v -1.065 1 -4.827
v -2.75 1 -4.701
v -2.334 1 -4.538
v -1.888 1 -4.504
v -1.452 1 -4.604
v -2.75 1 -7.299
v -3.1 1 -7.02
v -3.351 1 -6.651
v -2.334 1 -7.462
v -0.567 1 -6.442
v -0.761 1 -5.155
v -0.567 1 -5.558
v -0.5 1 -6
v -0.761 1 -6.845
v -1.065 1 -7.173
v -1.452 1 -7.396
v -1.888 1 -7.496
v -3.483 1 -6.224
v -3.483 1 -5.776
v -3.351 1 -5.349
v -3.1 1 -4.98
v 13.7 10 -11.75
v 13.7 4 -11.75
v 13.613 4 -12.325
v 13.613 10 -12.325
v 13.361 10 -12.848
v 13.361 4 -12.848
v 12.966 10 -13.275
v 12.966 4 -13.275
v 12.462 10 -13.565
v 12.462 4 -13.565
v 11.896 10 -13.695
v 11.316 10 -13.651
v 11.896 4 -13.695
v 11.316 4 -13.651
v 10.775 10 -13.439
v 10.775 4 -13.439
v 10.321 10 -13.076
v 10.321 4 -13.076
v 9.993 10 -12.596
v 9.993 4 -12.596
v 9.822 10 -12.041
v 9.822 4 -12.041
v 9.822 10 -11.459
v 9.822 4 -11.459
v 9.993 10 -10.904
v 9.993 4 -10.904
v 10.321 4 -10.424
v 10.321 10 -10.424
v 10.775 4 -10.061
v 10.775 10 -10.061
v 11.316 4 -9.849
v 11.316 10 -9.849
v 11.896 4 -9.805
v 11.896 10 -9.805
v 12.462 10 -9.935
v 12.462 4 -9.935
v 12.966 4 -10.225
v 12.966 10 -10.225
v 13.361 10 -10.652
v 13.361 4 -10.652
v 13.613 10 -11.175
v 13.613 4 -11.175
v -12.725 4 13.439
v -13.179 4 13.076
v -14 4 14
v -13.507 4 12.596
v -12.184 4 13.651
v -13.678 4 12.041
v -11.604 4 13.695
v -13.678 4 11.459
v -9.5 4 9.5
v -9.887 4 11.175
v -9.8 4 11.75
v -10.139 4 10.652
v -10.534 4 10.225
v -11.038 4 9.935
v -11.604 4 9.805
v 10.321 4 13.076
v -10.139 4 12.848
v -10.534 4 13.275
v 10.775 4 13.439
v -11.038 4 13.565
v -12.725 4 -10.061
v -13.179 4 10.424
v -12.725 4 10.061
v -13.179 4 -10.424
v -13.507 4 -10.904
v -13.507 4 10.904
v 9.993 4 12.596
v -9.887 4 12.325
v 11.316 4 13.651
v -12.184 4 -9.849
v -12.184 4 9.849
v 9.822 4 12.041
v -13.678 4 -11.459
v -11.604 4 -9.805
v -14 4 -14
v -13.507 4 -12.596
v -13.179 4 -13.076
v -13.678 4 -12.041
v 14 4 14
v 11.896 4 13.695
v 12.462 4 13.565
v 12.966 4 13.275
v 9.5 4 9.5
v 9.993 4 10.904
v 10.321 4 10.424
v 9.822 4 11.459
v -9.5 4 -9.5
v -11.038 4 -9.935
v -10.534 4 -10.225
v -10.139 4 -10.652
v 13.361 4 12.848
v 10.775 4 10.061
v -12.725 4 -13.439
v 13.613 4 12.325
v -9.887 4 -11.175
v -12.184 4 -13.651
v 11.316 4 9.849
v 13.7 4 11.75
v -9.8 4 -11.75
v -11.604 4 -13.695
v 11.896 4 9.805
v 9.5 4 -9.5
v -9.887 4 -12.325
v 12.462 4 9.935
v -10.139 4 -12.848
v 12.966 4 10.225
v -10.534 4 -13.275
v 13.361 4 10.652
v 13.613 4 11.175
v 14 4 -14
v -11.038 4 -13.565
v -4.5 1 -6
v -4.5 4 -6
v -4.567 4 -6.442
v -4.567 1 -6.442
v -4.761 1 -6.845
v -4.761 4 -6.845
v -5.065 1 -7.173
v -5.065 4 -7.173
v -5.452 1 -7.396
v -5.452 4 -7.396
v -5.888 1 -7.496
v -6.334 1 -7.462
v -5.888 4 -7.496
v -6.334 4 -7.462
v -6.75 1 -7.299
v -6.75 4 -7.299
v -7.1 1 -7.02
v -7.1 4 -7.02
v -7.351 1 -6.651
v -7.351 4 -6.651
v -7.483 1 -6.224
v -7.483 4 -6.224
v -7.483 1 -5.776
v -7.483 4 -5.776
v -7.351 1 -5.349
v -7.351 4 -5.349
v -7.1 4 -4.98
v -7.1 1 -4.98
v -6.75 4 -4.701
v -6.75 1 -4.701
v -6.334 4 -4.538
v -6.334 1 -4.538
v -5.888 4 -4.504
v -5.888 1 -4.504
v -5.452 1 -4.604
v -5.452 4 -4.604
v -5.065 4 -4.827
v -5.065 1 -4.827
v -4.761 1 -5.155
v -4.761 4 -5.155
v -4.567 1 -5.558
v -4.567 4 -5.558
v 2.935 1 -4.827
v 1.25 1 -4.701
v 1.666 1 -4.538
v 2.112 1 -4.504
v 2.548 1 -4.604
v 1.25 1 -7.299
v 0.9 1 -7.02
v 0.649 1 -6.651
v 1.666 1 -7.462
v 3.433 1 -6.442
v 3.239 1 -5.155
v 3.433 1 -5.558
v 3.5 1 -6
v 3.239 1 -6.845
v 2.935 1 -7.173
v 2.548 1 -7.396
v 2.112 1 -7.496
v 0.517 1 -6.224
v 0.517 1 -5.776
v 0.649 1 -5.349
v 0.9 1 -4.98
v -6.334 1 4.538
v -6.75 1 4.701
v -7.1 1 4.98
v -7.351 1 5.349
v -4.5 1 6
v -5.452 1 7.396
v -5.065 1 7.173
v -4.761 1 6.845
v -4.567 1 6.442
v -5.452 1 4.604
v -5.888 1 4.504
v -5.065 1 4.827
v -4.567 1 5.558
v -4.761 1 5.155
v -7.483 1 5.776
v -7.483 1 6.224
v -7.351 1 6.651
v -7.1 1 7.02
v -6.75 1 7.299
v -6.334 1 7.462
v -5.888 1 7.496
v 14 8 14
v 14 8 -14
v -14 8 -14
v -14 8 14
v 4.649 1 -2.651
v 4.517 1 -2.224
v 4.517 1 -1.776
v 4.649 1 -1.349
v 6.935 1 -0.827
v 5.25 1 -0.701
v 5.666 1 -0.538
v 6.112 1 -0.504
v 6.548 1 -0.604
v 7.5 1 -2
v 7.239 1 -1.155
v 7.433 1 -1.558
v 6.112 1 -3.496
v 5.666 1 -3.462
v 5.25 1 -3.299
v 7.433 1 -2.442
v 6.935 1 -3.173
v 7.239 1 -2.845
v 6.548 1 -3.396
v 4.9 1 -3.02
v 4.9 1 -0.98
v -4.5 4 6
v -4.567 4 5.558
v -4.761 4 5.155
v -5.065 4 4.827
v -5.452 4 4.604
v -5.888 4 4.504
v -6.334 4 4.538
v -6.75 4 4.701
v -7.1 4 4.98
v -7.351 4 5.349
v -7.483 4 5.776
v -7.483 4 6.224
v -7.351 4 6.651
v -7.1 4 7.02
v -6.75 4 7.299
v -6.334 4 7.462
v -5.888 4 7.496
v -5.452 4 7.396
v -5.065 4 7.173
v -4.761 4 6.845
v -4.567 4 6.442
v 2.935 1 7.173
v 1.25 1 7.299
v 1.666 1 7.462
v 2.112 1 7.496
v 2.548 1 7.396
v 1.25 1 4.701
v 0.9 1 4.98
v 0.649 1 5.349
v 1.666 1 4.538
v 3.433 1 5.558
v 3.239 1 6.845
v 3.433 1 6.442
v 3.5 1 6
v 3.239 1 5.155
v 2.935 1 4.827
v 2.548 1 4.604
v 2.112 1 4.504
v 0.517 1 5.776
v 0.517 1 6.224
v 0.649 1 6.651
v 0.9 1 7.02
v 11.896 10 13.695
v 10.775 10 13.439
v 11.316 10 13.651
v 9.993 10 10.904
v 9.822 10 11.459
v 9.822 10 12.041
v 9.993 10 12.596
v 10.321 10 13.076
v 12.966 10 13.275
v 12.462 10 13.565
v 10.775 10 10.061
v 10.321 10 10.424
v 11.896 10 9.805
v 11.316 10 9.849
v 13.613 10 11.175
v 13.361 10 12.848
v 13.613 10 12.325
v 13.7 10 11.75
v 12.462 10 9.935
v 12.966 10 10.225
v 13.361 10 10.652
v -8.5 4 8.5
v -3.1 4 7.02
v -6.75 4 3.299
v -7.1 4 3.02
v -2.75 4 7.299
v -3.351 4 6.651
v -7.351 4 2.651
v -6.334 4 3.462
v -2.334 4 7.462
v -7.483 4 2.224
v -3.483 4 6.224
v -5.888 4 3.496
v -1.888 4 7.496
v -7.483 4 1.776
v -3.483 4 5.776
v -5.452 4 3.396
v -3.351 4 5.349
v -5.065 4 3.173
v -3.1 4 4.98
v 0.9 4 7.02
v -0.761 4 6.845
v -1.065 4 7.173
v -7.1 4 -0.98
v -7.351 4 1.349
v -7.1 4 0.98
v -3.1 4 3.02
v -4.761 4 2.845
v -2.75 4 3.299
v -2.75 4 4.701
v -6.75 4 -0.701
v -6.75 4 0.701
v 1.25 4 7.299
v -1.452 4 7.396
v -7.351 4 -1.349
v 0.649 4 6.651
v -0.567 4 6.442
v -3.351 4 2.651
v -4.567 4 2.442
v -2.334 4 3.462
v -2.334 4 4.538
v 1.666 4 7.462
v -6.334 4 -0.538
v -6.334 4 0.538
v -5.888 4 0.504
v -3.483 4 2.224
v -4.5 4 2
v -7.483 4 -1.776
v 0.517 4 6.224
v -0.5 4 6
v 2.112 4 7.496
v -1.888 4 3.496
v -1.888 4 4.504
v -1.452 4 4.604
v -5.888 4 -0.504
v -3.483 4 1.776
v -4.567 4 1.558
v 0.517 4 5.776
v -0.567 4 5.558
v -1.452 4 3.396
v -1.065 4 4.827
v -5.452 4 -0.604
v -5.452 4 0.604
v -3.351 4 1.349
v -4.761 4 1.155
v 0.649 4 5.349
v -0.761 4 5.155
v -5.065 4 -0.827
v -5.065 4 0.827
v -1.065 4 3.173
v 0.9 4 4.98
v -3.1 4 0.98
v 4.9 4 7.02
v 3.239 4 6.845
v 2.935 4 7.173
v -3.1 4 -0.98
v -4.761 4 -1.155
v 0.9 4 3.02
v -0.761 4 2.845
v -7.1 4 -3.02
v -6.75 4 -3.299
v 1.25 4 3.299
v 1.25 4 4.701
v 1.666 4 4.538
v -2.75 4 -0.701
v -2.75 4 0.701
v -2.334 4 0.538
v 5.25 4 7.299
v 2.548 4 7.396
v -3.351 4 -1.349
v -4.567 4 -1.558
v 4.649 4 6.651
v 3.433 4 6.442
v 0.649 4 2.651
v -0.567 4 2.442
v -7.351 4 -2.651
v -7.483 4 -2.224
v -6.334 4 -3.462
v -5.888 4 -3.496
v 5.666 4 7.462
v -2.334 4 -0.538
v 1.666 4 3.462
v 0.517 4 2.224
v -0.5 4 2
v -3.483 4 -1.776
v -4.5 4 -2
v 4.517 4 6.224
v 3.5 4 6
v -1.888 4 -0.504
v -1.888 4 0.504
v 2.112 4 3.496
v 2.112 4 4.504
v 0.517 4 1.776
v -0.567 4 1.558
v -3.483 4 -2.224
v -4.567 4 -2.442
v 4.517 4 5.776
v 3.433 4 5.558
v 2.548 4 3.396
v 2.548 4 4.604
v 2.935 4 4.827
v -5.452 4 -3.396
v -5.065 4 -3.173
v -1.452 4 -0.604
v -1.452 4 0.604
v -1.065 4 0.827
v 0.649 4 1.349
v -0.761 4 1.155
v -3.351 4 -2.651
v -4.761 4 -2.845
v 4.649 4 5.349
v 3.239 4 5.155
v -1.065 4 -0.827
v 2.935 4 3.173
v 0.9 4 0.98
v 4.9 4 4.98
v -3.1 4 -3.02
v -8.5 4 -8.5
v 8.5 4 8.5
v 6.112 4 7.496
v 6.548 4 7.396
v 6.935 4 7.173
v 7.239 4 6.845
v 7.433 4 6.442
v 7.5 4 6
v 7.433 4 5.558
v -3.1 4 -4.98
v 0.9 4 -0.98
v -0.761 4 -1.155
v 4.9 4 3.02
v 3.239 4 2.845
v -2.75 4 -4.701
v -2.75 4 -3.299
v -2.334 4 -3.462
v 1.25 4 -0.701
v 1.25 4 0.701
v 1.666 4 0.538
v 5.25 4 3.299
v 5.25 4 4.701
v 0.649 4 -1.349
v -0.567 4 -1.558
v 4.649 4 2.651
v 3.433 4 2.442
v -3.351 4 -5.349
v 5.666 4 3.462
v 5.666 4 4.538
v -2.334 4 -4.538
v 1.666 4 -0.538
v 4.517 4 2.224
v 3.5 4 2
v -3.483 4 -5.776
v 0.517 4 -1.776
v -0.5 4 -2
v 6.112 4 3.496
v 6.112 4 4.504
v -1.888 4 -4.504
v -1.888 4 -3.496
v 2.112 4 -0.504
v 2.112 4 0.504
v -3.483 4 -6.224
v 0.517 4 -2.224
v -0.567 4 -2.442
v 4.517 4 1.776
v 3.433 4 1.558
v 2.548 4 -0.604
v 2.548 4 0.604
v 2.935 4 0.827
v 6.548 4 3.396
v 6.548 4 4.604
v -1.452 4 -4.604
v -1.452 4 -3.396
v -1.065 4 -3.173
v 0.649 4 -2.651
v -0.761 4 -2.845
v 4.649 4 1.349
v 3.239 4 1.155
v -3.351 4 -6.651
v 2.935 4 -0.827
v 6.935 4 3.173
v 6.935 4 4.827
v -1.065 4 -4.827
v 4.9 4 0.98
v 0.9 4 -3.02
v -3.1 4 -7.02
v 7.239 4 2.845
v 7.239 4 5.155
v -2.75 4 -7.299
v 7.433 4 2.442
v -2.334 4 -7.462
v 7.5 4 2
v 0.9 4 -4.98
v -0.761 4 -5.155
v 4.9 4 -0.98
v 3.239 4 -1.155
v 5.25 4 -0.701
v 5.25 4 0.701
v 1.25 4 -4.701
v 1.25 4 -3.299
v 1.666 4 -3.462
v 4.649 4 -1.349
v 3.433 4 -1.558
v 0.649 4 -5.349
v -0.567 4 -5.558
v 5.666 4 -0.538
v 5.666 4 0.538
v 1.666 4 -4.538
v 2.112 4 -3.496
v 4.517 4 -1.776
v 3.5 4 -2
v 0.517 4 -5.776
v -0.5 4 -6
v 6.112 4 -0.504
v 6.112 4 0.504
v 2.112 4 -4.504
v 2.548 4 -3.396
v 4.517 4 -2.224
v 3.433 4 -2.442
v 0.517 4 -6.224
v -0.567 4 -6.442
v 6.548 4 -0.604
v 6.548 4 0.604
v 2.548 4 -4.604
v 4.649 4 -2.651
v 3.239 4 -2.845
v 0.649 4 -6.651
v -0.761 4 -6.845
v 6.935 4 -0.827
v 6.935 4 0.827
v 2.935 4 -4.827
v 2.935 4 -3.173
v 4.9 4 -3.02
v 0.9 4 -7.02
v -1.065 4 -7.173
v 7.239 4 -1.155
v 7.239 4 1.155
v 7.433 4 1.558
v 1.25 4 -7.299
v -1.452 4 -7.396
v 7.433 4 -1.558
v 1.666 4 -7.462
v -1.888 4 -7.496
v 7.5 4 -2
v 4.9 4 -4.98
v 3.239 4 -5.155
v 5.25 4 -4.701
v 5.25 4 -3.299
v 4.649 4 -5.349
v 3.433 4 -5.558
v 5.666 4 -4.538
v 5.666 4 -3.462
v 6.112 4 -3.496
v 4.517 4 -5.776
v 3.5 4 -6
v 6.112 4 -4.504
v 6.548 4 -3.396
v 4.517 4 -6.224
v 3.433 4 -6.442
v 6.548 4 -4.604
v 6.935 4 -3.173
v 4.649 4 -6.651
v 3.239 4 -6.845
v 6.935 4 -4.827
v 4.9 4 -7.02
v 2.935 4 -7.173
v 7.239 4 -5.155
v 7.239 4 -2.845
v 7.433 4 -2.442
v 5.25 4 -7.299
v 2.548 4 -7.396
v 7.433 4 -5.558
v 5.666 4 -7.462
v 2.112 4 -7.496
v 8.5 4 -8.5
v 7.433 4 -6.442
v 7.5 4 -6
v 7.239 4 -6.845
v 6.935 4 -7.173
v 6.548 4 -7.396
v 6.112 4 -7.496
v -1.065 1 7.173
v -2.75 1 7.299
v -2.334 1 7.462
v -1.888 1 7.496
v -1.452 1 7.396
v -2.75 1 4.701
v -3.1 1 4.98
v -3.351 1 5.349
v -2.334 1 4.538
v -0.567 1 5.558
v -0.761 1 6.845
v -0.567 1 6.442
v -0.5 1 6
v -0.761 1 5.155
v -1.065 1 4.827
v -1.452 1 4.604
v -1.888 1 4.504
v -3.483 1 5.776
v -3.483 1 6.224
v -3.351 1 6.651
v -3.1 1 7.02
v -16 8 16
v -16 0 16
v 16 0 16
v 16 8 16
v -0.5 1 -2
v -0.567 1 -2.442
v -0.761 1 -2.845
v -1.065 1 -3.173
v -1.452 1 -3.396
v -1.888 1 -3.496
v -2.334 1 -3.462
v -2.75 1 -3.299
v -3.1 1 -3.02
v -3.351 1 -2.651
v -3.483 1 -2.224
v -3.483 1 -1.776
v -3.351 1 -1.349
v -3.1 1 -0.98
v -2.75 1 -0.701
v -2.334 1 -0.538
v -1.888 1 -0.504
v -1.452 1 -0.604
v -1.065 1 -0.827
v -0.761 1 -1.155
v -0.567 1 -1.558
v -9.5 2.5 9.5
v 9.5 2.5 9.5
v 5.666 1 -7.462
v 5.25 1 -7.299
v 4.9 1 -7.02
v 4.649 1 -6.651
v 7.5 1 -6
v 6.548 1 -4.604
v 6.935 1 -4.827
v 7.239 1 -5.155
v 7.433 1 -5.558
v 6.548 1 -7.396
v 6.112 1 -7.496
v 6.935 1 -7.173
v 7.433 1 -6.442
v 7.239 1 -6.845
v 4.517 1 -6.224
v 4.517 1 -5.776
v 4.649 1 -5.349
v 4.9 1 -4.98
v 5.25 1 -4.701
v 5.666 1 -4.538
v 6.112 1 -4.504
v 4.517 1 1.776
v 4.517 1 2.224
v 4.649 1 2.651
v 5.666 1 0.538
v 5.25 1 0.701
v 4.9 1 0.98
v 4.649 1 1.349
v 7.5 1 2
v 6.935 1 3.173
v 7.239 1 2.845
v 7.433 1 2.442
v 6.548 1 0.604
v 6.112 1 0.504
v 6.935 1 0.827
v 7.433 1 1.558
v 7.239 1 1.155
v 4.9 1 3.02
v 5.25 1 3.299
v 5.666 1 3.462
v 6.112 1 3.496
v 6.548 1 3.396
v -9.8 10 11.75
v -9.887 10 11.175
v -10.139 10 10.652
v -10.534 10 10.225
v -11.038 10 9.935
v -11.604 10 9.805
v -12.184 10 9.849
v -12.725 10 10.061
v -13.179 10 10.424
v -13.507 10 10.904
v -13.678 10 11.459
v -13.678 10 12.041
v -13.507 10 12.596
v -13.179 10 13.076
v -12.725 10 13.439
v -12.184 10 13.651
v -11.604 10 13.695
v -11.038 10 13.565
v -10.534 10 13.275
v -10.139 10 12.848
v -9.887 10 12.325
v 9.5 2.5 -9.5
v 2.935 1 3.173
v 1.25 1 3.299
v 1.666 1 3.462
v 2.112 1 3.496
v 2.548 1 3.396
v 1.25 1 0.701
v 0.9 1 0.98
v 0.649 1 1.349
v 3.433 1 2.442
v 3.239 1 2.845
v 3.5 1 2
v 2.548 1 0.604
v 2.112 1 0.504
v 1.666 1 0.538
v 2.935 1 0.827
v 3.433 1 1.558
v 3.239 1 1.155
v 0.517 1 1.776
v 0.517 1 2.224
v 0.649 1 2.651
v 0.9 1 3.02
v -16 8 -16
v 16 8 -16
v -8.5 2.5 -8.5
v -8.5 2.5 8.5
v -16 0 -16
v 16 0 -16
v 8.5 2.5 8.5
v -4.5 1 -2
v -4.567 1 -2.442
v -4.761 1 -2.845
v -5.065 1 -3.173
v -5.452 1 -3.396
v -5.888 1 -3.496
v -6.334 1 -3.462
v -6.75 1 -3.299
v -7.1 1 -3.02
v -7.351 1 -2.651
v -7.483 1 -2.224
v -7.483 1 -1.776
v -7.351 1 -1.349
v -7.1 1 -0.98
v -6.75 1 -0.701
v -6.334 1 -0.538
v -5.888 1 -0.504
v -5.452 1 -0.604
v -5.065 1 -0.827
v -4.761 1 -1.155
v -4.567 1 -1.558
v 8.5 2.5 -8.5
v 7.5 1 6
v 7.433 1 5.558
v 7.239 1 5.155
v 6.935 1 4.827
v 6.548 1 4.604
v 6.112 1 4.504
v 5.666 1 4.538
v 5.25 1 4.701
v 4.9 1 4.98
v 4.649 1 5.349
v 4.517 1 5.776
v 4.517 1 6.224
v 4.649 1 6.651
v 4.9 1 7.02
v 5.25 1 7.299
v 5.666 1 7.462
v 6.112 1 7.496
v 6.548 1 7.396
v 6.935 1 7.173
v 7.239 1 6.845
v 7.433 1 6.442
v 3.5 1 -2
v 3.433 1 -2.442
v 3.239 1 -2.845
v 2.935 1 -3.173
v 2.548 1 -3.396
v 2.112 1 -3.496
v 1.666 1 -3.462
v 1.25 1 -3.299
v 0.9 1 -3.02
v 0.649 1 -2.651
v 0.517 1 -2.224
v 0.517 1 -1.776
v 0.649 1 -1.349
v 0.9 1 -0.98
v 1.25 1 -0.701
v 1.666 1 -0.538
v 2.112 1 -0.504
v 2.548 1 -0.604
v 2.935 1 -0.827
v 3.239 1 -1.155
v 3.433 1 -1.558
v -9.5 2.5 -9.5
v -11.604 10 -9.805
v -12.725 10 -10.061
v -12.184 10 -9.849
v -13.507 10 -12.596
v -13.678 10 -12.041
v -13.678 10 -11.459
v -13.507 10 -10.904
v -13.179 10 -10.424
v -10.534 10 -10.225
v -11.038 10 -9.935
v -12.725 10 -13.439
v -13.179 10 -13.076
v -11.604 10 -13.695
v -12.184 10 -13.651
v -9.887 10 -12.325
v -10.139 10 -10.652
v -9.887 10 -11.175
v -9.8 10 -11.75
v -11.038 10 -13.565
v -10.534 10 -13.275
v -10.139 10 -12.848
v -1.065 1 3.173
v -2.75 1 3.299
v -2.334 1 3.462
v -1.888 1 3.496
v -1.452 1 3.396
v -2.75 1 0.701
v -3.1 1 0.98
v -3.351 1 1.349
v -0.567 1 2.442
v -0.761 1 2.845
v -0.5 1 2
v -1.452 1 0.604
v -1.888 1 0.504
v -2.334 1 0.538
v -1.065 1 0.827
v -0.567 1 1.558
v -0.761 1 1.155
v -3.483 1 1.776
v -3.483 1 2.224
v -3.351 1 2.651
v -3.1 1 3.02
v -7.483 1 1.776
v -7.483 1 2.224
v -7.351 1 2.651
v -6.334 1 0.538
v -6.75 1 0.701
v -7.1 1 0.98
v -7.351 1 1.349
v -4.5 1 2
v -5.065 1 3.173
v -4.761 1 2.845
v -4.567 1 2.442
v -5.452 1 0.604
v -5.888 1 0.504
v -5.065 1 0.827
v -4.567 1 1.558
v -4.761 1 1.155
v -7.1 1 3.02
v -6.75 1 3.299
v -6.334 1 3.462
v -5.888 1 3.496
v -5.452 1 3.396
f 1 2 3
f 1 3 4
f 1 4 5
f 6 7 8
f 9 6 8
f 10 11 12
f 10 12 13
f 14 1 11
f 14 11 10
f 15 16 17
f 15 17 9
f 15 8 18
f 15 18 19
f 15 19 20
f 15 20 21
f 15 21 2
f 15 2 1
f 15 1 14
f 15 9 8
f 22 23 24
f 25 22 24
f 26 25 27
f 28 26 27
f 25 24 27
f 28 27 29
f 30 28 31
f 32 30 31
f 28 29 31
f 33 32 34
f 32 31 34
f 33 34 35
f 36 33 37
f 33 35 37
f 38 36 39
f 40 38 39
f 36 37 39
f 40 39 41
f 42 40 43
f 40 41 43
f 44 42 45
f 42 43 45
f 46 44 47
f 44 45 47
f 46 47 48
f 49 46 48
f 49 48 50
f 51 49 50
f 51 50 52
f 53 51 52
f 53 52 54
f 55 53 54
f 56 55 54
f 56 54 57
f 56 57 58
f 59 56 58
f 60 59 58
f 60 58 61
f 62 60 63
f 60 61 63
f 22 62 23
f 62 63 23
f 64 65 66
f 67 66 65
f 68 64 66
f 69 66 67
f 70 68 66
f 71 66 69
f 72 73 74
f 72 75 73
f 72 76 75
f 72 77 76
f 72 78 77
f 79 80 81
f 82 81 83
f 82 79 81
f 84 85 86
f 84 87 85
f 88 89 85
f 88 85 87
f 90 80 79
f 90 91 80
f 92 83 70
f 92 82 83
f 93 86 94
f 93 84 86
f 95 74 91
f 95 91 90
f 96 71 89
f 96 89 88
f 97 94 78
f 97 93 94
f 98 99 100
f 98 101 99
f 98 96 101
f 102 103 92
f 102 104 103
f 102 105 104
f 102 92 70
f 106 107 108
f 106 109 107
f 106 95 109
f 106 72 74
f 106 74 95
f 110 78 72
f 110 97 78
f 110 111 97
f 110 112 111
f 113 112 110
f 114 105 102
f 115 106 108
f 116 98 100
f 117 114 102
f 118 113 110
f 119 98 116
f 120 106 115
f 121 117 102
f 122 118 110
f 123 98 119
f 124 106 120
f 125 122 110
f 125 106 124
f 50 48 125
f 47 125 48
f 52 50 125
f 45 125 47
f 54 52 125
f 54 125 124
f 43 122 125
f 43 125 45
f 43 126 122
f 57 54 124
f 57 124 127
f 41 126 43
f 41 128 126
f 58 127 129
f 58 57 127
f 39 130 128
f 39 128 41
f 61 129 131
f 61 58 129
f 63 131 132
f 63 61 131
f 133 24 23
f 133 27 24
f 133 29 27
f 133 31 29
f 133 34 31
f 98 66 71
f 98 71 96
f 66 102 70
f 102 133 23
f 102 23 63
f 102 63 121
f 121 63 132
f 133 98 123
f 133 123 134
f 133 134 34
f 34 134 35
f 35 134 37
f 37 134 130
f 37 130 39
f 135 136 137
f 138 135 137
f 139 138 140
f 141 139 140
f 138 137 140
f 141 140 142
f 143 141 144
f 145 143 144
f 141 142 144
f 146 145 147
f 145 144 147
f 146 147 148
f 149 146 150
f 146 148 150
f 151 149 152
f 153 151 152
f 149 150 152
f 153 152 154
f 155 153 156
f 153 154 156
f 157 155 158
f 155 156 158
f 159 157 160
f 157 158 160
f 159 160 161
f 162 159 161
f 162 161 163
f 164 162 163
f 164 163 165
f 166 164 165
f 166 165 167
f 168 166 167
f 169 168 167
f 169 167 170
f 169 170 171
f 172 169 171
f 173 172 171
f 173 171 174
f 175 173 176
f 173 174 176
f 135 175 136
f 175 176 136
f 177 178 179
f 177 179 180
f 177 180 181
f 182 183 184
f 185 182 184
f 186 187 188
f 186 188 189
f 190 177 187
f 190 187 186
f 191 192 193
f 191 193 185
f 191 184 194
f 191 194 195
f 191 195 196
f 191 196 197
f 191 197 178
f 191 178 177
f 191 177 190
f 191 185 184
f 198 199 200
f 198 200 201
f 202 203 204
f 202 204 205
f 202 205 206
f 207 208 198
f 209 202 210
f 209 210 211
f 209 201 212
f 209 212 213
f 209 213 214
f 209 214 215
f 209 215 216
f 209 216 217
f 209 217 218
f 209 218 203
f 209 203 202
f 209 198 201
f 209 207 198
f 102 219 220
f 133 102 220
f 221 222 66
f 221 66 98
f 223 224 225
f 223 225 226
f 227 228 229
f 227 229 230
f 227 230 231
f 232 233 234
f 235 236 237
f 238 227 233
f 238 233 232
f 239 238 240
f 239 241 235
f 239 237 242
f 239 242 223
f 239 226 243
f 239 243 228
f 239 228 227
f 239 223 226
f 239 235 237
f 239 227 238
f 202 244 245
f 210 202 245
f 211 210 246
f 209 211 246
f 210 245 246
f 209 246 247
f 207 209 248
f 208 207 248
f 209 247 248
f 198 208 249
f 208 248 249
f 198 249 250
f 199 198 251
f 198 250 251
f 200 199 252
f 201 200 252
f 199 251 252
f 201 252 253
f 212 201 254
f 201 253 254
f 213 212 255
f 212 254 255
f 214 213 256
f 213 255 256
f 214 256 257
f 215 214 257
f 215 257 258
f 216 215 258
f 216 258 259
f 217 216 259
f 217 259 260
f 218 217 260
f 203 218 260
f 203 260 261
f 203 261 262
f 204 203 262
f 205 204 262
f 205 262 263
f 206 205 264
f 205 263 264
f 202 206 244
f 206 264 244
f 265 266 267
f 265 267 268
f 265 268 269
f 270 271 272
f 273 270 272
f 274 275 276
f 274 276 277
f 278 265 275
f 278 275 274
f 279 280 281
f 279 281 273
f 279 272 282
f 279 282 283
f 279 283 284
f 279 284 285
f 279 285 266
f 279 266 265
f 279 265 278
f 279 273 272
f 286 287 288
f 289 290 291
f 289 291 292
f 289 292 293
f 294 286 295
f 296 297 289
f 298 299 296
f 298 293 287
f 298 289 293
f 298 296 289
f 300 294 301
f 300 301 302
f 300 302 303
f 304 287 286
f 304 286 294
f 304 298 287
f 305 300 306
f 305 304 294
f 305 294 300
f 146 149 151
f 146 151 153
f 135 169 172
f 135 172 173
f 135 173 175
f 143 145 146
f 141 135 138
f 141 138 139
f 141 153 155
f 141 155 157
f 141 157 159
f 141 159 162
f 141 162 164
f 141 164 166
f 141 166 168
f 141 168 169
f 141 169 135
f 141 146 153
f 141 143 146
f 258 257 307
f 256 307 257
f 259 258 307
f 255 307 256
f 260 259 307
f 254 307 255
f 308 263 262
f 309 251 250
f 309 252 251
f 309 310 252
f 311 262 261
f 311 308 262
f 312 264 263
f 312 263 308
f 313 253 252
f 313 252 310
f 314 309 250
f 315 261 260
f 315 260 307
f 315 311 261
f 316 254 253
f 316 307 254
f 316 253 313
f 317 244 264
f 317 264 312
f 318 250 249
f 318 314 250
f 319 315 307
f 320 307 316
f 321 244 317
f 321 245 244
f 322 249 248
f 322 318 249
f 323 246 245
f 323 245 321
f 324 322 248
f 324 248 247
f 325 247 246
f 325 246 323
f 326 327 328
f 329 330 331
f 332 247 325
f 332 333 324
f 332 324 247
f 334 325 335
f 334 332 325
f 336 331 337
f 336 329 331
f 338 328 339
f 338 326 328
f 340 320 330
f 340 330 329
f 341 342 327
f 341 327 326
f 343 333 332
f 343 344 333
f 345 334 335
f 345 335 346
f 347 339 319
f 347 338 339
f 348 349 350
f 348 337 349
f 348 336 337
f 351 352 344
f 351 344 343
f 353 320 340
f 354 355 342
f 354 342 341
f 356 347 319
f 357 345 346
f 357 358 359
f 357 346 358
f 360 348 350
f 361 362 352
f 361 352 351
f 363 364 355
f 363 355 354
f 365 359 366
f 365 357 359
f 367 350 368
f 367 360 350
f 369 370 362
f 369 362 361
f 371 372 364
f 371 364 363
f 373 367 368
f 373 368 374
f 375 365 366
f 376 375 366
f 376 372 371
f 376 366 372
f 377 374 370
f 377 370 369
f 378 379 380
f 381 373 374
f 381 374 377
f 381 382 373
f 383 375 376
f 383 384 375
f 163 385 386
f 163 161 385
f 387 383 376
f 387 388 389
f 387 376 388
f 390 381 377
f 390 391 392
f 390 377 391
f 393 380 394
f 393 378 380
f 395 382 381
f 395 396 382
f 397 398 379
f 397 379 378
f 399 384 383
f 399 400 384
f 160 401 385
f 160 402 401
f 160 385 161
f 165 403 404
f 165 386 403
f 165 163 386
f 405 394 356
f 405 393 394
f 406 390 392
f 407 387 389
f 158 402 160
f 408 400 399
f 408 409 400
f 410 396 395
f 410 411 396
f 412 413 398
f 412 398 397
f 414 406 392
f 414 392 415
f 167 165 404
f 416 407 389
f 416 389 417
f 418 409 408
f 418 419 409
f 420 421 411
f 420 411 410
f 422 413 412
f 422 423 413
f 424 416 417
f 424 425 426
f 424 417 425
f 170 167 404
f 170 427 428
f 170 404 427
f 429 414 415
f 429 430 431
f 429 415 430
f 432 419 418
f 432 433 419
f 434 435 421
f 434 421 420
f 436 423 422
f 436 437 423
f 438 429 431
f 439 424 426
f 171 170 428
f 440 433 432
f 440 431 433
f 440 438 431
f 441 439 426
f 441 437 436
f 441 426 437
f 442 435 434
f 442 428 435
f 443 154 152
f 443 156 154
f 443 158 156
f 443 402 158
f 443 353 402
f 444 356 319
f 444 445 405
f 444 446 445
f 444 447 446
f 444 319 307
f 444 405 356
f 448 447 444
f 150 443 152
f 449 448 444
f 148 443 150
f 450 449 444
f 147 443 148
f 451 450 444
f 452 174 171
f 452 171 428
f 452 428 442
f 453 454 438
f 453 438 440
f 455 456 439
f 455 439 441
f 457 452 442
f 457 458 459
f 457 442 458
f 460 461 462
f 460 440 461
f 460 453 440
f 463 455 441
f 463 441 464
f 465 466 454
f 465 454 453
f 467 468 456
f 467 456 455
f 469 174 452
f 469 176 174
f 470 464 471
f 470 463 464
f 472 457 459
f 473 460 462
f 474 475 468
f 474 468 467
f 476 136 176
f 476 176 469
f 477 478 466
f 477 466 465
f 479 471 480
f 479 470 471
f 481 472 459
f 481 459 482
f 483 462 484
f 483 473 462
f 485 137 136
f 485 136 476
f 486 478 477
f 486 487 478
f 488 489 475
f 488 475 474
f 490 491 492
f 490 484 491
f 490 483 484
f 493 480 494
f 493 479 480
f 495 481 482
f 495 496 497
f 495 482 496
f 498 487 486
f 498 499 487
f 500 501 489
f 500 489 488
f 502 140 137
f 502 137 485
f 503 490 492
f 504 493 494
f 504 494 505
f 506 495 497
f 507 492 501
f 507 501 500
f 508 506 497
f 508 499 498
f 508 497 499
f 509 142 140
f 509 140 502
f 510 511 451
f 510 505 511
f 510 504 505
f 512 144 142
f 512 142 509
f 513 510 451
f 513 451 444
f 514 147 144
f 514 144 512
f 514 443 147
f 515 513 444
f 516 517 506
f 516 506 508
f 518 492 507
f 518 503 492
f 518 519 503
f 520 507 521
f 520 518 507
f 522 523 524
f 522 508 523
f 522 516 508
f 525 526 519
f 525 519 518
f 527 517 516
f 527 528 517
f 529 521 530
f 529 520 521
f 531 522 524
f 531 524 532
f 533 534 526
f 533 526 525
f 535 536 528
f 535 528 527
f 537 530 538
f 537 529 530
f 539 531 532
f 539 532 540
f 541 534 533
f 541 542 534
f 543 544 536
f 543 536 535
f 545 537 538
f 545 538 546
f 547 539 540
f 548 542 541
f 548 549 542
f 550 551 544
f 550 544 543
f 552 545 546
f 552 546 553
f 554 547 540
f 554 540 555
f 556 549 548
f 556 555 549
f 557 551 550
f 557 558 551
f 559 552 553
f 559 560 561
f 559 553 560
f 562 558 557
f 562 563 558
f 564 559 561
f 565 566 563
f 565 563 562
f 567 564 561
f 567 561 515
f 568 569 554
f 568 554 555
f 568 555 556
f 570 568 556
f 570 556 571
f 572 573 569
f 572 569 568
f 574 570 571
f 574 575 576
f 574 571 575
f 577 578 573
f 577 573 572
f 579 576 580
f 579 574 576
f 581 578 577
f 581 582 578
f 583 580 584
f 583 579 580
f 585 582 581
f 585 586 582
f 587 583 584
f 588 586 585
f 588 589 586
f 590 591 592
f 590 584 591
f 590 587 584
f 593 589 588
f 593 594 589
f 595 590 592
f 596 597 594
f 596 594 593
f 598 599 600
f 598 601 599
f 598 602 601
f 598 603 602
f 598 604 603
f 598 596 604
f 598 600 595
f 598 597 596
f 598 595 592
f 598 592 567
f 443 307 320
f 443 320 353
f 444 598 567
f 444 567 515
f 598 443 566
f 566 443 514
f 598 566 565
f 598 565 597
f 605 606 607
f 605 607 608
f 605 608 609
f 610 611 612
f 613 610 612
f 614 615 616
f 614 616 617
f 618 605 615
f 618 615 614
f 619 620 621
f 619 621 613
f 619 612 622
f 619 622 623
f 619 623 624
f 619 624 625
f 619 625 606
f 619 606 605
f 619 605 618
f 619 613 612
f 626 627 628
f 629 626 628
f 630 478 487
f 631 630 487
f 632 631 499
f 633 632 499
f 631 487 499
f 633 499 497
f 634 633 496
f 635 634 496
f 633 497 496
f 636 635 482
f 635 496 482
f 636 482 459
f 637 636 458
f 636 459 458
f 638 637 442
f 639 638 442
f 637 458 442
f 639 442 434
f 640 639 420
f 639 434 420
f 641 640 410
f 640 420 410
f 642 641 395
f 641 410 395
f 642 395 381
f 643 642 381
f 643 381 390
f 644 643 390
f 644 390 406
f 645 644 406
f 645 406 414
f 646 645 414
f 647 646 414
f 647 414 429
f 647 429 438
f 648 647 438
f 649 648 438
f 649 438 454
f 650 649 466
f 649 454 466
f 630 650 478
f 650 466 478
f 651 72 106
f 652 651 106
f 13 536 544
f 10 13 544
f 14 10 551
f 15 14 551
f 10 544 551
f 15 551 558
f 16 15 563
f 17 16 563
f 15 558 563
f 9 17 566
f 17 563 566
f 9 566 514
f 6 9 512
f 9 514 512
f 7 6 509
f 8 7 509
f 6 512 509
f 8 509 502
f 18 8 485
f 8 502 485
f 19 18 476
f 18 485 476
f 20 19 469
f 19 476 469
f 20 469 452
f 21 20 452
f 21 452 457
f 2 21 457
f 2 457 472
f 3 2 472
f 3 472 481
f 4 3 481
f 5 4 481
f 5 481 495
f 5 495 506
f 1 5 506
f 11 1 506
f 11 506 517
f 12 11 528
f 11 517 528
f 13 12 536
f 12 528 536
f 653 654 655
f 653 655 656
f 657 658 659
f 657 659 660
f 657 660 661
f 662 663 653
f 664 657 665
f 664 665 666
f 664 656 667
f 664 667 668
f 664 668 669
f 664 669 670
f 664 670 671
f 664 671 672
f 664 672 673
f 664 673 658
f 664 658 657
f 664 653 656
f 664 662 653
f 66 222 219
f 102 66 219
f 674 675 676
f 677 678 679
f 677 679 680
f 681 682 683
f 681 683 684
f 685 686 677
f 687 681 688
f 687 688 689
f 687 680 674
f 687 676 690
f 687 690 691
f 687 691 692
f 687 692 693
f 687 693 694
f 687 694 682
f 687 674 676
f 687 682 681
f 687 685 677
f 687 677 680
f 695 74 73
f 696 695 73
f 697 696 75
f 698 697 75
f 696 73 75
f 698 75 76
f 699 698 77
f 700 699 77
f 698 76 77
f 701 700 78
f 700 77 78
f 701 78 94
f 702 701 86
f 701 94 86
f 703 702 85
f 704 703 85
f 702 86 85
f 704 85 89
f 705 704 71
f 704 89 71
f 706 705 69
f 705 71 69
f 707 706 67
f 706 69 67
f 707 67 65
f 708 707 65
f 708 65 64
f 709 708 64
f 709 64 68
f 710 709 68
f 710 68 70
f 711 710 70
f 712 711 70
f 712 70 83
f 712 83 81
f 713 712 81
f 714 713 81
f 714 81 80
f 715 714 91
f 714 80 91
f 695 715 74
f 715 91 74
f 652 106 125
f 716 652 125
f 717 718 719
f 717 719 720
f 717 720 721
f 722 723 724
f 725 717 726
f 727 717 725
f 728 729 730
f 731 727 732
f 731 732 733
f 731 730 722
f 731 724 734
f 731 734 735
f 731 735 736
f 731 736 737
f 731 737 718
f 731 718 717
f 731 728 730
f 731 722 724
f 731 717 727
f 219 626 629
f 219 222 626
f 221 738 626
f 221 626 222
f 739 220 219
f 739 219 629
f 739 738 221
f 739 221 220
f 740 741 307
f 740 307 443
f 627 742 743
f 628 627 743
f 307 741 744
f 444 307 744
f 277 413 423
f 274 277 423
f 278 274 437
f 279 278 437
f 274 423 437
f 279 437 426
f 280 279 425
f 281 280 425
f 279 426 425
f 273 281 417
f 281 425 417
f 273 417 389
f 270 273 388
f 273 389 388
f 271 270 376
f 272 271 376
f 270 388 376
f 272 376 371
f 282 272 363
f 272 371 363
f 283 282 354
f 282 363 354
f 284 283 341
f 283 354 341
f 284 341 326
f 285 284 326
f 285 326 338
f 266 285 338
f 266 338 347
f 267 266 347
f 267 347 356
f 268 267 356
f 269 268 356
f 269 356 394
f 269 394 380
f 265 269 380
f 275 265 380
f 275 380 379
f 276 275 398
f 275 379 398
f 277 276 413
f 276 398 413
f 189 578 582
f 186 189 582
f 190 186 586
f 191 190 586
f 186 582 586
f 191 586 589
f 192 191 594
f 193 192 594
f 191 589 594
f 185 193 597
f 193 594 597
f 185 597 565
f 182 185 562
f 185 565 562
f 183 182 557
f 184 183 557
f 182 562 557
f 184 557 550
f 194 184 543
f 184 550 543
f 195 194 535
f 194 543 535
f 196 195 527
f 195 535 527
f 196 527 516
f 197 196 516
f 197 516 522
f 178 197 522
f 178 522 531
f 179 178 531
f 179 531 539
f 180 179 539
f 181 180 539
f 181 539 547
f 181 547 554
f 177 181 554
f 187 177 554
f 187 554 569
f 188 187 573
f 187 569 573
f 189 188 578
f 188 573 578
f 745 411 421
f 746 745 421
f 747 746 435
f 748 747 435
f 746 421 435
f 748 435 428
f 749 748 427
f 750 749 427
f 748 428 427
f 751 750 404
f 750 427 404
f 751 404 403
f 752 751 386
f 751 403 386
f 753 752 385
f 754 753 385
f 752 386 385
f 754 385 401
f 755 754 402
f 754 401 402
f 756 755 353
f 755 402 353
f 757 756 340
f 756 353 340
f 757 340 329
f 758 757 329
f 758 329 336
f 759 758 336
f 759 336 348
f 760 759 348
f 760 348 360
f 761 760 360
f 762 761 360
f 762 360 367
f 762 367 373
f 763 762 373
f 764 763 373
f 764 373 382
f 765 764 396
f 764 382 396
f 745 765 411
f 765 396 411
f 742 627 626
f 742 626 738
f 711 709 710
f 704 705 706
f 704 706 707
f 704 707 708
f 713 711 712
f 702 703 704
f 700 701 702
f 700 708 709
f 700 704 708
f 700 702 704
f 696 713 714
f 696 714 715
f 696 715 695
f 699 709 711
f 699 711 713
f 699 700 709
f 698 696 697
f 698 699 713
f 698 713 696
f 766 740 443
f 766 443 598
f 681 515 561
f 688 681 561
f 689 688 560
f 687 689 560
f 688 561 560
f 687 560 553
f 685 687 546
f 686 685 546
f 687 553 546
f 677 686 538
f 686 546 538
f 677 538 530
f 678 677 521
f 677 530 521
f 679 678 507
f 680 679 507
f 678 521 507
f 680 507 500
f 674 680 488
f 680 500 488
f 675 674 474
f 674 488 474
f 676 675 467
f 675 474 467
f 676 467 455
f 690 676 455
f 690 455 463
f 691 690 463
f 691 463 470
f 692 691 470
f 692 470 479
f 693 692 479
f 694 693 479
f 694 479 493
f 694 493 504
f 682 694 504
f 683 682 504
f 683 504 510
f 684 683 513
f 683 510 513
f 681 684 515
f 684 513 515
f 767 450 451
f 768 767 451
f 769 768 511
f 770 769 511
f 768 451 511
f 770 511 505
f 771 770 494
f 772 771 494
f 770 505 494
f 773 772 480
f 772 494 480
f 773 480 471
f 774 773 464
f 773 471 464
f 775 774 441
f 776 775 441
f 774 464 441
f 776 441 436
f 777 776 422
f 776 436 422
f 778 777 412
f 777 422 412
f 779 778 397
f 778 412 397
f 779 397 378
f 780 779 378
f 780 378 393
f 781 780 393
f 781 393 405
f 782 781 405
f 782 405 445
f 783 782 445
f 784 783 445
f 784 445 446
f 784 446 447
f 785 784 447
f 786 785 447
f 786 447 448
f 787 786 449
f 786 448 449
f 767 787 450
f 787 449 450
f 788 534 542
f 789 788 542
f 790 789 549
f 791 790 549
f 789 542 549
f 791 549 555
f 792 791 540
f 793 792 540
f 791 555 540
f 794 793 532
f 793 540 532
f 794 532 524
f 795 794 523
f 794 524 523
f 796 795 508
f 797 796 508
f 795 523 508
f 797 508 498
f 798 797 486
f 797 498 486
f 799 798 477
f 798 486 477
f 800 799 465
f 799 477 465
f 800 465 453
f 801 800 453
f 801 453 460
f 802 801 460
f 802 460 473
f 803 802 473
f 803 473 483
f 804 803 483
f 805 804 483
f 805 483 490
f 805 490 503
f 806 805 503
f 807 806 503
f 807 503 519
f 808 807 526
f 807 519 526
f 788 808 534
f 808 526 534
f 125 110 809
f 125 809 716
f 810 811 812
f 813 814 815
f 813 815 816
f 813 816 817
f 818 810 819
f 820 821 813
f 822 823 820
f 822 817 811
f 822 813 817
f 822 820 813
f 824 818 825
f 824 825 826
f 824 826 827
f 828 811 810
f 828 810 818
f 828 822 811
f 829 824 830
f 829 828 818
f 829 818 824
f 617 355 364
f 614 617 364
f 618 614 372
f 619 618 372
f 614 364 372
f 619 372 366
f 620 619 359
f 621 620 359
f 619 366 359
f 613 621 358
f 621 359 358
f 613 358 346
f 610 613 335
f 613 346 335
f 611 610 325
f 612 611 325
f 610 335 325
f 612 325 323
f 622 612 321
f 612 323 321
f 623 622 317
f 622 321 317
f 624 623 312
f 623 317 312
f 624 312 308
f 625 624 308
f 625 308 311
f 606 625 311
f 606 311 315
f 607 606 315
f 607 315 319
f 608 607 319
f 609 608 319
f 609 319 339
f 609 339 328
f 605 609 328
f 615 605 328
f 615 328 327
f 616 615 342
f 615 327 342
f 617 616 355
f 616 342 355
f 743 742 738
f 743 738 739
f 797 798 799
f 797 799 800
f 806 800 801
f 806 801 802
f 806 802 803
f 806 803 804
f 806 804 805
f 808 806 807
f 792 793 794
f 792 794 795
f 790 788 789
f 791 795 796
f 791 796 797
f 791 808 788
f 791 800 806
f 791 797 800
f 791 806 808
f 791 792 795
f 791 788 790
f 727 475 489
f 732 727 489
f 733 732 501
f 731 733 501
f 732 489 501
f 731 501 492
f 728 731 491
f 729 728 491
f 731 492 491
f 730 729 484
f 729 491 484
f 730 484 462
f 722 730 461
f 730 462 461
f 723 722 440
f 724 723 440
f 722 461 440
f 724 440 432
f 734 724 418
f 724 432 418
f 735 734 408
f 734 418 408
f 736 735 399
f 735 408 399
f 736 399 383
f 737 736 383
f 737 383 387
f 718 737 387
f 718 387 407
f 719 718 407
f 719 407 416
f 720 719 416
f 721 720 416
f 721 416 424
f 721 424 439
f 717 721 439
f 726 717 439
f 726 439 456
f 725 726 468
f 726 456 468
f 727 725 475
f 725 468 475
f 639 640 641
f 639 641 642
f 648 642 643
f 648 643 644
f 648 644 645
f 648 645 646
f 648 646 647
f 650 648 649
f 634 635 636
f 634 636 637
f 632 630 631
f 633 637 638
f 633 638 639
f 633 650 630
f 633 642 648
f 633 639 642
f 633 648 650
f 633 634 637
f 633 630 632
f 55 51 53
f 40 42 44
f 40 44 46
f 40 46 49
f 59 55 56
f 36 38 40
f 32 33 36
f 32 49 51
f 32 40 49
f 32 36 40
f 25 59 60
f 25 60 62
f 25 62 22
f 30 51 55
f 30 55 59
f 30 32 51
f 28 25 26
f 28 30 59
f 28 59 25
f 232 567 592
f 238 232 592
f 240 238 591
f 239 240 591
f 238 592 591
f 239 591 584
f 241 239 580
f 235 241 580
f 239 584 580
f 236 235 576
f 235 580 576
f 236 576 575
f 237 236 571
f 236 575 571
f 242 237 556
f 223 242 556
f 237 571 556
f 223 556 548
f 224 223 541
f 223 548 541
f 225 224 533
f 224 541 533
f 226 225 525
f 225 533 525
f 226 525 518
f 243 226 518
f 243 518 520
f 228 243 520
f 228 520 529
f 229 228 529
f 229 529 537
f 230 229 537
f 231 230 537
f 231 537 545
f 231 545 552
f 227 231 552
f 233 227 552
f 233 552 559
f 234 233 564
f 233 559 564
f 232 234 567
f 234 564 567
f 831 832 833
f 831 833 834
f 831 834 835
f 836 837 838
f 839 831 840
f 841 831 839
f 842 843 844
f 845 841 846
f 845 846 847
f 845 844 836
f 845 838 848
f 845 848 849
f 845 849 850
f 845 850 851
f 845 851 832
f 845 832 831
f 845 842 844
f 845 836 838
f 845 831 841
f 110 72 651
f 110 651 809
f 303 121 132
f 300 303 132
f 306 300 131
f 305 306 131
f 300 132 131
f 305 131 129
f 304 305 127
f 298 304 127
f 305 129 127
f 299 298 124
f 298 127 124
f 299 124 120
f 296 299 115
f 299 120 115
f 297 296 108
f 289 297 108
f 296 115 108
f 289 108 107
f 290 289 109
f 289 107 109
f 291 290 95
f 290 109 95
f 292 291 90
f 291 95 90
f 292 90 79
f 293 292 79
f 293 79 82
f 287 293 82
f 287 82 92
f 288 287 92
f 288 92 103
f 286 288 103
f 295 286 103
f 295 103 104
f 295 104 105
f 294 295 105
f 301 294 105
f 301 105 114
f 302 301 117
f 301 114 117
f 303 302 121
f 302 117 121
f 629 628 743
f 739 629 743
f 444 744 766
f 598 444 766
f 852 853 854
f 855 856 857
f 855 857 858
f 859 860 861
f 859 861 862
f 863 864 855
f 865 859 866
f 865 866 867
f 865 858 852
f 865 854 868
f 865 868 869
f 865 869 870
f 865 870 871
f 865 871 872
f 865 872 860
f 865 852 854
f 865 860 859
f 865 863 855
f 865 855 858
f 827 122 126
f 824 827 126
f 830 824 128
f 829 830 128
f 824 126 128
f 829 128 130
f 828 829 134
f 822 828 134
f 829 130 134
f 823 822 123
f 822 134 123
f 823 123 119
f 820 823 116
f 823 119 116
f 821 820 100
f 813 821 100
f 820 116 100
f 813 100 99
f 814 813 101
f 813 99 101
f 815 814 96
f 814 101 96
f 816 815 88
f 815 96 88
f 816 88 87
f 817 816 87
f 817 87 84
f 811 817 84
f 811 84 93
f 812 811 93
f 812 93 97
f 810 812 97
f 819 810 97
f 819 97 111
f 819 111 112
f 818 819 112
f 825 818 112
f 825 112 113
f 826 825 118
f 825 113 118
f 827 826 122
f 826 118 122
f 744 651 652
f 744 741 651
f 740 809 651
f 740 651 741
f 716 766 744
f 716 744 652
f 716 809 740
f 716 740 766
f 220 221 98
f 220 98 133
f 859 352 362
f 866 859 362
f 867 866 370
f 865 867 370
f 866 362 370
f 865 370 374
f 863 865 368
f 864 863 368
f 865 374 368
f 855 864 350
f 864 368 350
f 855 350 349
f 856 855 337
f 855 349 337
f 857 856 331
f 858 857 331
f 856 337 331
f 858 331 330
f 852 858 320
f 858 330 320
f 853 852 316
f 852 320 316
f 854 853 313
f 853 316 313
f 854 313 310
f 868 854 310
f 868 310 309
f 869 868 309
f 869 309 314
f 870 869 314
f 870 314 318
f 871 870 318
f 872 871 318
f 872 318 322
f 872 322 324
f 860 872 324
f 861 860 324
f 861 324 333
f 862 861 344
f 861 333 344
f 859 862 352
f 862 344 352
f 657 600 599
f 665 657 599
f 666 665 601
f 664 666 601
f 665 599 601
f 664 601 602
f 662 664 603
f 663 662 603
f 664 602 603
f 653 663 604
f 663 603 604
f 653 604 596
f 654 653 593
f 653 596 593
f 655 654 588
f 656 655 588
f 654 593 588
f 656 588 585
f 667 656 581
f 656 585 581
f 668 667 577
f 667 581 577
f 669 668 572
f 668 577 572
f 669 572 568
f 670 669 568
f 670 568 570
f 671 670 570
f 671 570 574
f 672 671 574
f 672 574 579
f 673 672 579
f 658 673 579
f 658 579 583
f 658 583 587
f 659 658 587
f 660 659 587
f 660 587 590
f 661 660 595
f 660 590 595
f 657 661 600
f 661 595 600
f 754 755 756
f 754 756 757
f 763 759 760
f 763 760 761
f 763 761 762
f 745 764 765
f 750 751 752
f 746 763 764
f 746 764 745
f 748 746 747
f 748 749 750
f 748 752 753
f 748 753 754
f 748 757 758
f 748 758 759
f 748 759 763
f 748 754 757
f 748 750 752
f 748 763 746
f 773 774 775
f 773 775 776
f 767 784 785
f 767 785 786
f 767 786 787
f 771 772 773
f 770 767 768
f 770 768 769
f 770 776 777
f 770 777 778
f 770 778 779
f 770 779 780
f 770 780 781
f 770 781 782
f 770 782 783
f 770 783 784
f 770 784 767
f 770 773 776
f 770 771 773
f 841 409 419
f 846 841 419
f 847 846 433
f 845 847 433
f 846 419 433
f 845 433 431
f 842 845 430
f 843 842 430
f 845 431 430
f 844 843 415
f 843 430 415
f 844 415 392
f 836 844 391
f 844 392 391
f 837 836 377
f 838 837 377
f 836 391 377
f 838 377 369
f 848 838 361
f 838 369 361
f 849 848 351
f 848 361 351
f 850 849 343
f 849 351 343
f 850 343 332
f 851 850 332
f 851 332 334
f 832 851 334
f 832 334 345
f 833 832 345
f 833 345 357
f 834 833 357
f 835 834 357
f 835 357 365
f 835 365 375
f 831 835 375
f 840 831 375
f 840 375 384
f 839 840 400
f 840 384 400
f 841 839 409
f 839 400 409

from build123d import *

# Parameters (mm, degrees)
SKETCH1_W           = 32
SKETCH1_H           = 32
BOSS_EXTRUDE1_DEPTH = 8
SKETCH2_W           = 28
SKETCH2_H           = 28
CUT_EXTRUDE1_DEPTH  = 4
SKETCH3_W           = 19
SKETCH3_H           = 19
CUT_EXTRUDE2_DEPTH  = 1.5
SKETCH4_W           = 17
SKETCH4_H           = 17
BOSS_EXTRUDE2_DEPTH = 1.5
SKETCH6_R           = 1.95
BOSS_EXTRUDE3_DEPTH = 6
SKETCH7_R           = 1.5
CUT_EXTRUDE3_DEPTH  = 3


with BuildPart() as part:
    # Sketch1 → Boss-Extrude1 (new body)
    with BuildSketch(Plane(origin=(0, 0, 0), x_dir=(1, 0, 0), z_dir=(0, 1, 0))):
        Rectangle(SKETCH1_W, SKETCH1_H)
    extrude(amount=BOSS_EXTRUDE1_DEPTH)

    # Sketch2 → Cut-Extrude1 (cut)
    with BuildSketch(Plane(origin=(0, 8, 0), x_dir=(1, 0, 0), z_dir=(0, 1, 0))):
        Rectangle(SKETCH2_W, SKETCH2_H)
    extrude(amount=-CUT_EXTRUDE1_DEPTH, mode=Mode.SUBTRACT)

    # Sketch3 → Cut-Extrude2 (cut)
    with BuildSketch(Plane(origin=(0, 4, 0), x_dir=(1, 0, 0), z_dir=(0, 1, 0))):
        Rectangle(SKETCH3_W, SKETCH3_H)
    extrude(amount=-CUT_EXTRUDE2_DEPTH, mode=Mode.SUBTRACT)

    # Sketch4 → Boss-Extrude2 (add)
    with BuildSketch(Plane(origin=(0, 2.5, 0), x_dir=(1, 0, 0), z_dir=(0, 1, 0))):
        Rectangle(SKETCH4_W, SKETCH4_H)
    extrude(amount=BOSS_EXTRUDE2_DEPTH)

    # Sketch6 → Boss-Extrude3 (add)
    with BuildSketch(Plane(origin=(0, 4, 0), x_dir=(1, 0, 0), z_dir=(0, 1, 0))):
        with Locations((-11.75, 11.75)):
            Circle(SKETCH6_R)
        with Locations((11.75, 11.75)):
            Circle(SKETCH6_R)
        with Locations((11.75, -11.75)):
            Circle(SKETCH6_R)
        with Locations((-11.75, -11.75)):
            Circle(SKETCH6_R)
    extrude(amount=BOSS_EXTRUDE3_DEPTH)

    # Sketch7 → Cut-Extrude3 (cut)
    with BuildSketch(Plane(origin=(0, 4, 0), x_dir=(1, 0, 0), z_dir=(0, 1, 0))):
        with Locations((-6, -6)):
            Circle(SKETCH7_R)
        with Locations((-2, -6)):
            Circle(SKETCH7_R)
        with Locations((2, -6)):
            Circle(SKETCH7_R)
        with Locations((6, -6)):
            Circle(SKETCH7_R)
        with Locations((-2, -2)):
            Circle(SKETCH7_R)
        with Locations((2, -2)):
            Circle(SKETCH7_R)
        with Locations((6, -2)):
            Circle(SKETCH7_R)
        with Locations((-2, 2)):
            Circle(SKETCH7_R)
        with Locations((2, 2)):
            Circle(SKETCH7_R)
        with Locations((6, 2)):
            Circle(SKETCH7_R)
        with Locations((-2, 6)):
            Circle(SKETCH7_R)
        with Locations((2, 6)):
            Circle(SKETCH7_R)
        with Locations((6, 6)):
            Circle(SKETCH7_R)
        with Locations((-6, -2)):
            Circle(SKETCH7_R)
        with Locations((-6, 2)):
            Circle(SKETCH7_R)
        with Locations((-6, 6)):
            Circle(SKETCH7_R)
    extrude(amount=-CUT_EXTRUDE3_DEPTH, mode=Mode.SUBTRACT)


solid = part.part
